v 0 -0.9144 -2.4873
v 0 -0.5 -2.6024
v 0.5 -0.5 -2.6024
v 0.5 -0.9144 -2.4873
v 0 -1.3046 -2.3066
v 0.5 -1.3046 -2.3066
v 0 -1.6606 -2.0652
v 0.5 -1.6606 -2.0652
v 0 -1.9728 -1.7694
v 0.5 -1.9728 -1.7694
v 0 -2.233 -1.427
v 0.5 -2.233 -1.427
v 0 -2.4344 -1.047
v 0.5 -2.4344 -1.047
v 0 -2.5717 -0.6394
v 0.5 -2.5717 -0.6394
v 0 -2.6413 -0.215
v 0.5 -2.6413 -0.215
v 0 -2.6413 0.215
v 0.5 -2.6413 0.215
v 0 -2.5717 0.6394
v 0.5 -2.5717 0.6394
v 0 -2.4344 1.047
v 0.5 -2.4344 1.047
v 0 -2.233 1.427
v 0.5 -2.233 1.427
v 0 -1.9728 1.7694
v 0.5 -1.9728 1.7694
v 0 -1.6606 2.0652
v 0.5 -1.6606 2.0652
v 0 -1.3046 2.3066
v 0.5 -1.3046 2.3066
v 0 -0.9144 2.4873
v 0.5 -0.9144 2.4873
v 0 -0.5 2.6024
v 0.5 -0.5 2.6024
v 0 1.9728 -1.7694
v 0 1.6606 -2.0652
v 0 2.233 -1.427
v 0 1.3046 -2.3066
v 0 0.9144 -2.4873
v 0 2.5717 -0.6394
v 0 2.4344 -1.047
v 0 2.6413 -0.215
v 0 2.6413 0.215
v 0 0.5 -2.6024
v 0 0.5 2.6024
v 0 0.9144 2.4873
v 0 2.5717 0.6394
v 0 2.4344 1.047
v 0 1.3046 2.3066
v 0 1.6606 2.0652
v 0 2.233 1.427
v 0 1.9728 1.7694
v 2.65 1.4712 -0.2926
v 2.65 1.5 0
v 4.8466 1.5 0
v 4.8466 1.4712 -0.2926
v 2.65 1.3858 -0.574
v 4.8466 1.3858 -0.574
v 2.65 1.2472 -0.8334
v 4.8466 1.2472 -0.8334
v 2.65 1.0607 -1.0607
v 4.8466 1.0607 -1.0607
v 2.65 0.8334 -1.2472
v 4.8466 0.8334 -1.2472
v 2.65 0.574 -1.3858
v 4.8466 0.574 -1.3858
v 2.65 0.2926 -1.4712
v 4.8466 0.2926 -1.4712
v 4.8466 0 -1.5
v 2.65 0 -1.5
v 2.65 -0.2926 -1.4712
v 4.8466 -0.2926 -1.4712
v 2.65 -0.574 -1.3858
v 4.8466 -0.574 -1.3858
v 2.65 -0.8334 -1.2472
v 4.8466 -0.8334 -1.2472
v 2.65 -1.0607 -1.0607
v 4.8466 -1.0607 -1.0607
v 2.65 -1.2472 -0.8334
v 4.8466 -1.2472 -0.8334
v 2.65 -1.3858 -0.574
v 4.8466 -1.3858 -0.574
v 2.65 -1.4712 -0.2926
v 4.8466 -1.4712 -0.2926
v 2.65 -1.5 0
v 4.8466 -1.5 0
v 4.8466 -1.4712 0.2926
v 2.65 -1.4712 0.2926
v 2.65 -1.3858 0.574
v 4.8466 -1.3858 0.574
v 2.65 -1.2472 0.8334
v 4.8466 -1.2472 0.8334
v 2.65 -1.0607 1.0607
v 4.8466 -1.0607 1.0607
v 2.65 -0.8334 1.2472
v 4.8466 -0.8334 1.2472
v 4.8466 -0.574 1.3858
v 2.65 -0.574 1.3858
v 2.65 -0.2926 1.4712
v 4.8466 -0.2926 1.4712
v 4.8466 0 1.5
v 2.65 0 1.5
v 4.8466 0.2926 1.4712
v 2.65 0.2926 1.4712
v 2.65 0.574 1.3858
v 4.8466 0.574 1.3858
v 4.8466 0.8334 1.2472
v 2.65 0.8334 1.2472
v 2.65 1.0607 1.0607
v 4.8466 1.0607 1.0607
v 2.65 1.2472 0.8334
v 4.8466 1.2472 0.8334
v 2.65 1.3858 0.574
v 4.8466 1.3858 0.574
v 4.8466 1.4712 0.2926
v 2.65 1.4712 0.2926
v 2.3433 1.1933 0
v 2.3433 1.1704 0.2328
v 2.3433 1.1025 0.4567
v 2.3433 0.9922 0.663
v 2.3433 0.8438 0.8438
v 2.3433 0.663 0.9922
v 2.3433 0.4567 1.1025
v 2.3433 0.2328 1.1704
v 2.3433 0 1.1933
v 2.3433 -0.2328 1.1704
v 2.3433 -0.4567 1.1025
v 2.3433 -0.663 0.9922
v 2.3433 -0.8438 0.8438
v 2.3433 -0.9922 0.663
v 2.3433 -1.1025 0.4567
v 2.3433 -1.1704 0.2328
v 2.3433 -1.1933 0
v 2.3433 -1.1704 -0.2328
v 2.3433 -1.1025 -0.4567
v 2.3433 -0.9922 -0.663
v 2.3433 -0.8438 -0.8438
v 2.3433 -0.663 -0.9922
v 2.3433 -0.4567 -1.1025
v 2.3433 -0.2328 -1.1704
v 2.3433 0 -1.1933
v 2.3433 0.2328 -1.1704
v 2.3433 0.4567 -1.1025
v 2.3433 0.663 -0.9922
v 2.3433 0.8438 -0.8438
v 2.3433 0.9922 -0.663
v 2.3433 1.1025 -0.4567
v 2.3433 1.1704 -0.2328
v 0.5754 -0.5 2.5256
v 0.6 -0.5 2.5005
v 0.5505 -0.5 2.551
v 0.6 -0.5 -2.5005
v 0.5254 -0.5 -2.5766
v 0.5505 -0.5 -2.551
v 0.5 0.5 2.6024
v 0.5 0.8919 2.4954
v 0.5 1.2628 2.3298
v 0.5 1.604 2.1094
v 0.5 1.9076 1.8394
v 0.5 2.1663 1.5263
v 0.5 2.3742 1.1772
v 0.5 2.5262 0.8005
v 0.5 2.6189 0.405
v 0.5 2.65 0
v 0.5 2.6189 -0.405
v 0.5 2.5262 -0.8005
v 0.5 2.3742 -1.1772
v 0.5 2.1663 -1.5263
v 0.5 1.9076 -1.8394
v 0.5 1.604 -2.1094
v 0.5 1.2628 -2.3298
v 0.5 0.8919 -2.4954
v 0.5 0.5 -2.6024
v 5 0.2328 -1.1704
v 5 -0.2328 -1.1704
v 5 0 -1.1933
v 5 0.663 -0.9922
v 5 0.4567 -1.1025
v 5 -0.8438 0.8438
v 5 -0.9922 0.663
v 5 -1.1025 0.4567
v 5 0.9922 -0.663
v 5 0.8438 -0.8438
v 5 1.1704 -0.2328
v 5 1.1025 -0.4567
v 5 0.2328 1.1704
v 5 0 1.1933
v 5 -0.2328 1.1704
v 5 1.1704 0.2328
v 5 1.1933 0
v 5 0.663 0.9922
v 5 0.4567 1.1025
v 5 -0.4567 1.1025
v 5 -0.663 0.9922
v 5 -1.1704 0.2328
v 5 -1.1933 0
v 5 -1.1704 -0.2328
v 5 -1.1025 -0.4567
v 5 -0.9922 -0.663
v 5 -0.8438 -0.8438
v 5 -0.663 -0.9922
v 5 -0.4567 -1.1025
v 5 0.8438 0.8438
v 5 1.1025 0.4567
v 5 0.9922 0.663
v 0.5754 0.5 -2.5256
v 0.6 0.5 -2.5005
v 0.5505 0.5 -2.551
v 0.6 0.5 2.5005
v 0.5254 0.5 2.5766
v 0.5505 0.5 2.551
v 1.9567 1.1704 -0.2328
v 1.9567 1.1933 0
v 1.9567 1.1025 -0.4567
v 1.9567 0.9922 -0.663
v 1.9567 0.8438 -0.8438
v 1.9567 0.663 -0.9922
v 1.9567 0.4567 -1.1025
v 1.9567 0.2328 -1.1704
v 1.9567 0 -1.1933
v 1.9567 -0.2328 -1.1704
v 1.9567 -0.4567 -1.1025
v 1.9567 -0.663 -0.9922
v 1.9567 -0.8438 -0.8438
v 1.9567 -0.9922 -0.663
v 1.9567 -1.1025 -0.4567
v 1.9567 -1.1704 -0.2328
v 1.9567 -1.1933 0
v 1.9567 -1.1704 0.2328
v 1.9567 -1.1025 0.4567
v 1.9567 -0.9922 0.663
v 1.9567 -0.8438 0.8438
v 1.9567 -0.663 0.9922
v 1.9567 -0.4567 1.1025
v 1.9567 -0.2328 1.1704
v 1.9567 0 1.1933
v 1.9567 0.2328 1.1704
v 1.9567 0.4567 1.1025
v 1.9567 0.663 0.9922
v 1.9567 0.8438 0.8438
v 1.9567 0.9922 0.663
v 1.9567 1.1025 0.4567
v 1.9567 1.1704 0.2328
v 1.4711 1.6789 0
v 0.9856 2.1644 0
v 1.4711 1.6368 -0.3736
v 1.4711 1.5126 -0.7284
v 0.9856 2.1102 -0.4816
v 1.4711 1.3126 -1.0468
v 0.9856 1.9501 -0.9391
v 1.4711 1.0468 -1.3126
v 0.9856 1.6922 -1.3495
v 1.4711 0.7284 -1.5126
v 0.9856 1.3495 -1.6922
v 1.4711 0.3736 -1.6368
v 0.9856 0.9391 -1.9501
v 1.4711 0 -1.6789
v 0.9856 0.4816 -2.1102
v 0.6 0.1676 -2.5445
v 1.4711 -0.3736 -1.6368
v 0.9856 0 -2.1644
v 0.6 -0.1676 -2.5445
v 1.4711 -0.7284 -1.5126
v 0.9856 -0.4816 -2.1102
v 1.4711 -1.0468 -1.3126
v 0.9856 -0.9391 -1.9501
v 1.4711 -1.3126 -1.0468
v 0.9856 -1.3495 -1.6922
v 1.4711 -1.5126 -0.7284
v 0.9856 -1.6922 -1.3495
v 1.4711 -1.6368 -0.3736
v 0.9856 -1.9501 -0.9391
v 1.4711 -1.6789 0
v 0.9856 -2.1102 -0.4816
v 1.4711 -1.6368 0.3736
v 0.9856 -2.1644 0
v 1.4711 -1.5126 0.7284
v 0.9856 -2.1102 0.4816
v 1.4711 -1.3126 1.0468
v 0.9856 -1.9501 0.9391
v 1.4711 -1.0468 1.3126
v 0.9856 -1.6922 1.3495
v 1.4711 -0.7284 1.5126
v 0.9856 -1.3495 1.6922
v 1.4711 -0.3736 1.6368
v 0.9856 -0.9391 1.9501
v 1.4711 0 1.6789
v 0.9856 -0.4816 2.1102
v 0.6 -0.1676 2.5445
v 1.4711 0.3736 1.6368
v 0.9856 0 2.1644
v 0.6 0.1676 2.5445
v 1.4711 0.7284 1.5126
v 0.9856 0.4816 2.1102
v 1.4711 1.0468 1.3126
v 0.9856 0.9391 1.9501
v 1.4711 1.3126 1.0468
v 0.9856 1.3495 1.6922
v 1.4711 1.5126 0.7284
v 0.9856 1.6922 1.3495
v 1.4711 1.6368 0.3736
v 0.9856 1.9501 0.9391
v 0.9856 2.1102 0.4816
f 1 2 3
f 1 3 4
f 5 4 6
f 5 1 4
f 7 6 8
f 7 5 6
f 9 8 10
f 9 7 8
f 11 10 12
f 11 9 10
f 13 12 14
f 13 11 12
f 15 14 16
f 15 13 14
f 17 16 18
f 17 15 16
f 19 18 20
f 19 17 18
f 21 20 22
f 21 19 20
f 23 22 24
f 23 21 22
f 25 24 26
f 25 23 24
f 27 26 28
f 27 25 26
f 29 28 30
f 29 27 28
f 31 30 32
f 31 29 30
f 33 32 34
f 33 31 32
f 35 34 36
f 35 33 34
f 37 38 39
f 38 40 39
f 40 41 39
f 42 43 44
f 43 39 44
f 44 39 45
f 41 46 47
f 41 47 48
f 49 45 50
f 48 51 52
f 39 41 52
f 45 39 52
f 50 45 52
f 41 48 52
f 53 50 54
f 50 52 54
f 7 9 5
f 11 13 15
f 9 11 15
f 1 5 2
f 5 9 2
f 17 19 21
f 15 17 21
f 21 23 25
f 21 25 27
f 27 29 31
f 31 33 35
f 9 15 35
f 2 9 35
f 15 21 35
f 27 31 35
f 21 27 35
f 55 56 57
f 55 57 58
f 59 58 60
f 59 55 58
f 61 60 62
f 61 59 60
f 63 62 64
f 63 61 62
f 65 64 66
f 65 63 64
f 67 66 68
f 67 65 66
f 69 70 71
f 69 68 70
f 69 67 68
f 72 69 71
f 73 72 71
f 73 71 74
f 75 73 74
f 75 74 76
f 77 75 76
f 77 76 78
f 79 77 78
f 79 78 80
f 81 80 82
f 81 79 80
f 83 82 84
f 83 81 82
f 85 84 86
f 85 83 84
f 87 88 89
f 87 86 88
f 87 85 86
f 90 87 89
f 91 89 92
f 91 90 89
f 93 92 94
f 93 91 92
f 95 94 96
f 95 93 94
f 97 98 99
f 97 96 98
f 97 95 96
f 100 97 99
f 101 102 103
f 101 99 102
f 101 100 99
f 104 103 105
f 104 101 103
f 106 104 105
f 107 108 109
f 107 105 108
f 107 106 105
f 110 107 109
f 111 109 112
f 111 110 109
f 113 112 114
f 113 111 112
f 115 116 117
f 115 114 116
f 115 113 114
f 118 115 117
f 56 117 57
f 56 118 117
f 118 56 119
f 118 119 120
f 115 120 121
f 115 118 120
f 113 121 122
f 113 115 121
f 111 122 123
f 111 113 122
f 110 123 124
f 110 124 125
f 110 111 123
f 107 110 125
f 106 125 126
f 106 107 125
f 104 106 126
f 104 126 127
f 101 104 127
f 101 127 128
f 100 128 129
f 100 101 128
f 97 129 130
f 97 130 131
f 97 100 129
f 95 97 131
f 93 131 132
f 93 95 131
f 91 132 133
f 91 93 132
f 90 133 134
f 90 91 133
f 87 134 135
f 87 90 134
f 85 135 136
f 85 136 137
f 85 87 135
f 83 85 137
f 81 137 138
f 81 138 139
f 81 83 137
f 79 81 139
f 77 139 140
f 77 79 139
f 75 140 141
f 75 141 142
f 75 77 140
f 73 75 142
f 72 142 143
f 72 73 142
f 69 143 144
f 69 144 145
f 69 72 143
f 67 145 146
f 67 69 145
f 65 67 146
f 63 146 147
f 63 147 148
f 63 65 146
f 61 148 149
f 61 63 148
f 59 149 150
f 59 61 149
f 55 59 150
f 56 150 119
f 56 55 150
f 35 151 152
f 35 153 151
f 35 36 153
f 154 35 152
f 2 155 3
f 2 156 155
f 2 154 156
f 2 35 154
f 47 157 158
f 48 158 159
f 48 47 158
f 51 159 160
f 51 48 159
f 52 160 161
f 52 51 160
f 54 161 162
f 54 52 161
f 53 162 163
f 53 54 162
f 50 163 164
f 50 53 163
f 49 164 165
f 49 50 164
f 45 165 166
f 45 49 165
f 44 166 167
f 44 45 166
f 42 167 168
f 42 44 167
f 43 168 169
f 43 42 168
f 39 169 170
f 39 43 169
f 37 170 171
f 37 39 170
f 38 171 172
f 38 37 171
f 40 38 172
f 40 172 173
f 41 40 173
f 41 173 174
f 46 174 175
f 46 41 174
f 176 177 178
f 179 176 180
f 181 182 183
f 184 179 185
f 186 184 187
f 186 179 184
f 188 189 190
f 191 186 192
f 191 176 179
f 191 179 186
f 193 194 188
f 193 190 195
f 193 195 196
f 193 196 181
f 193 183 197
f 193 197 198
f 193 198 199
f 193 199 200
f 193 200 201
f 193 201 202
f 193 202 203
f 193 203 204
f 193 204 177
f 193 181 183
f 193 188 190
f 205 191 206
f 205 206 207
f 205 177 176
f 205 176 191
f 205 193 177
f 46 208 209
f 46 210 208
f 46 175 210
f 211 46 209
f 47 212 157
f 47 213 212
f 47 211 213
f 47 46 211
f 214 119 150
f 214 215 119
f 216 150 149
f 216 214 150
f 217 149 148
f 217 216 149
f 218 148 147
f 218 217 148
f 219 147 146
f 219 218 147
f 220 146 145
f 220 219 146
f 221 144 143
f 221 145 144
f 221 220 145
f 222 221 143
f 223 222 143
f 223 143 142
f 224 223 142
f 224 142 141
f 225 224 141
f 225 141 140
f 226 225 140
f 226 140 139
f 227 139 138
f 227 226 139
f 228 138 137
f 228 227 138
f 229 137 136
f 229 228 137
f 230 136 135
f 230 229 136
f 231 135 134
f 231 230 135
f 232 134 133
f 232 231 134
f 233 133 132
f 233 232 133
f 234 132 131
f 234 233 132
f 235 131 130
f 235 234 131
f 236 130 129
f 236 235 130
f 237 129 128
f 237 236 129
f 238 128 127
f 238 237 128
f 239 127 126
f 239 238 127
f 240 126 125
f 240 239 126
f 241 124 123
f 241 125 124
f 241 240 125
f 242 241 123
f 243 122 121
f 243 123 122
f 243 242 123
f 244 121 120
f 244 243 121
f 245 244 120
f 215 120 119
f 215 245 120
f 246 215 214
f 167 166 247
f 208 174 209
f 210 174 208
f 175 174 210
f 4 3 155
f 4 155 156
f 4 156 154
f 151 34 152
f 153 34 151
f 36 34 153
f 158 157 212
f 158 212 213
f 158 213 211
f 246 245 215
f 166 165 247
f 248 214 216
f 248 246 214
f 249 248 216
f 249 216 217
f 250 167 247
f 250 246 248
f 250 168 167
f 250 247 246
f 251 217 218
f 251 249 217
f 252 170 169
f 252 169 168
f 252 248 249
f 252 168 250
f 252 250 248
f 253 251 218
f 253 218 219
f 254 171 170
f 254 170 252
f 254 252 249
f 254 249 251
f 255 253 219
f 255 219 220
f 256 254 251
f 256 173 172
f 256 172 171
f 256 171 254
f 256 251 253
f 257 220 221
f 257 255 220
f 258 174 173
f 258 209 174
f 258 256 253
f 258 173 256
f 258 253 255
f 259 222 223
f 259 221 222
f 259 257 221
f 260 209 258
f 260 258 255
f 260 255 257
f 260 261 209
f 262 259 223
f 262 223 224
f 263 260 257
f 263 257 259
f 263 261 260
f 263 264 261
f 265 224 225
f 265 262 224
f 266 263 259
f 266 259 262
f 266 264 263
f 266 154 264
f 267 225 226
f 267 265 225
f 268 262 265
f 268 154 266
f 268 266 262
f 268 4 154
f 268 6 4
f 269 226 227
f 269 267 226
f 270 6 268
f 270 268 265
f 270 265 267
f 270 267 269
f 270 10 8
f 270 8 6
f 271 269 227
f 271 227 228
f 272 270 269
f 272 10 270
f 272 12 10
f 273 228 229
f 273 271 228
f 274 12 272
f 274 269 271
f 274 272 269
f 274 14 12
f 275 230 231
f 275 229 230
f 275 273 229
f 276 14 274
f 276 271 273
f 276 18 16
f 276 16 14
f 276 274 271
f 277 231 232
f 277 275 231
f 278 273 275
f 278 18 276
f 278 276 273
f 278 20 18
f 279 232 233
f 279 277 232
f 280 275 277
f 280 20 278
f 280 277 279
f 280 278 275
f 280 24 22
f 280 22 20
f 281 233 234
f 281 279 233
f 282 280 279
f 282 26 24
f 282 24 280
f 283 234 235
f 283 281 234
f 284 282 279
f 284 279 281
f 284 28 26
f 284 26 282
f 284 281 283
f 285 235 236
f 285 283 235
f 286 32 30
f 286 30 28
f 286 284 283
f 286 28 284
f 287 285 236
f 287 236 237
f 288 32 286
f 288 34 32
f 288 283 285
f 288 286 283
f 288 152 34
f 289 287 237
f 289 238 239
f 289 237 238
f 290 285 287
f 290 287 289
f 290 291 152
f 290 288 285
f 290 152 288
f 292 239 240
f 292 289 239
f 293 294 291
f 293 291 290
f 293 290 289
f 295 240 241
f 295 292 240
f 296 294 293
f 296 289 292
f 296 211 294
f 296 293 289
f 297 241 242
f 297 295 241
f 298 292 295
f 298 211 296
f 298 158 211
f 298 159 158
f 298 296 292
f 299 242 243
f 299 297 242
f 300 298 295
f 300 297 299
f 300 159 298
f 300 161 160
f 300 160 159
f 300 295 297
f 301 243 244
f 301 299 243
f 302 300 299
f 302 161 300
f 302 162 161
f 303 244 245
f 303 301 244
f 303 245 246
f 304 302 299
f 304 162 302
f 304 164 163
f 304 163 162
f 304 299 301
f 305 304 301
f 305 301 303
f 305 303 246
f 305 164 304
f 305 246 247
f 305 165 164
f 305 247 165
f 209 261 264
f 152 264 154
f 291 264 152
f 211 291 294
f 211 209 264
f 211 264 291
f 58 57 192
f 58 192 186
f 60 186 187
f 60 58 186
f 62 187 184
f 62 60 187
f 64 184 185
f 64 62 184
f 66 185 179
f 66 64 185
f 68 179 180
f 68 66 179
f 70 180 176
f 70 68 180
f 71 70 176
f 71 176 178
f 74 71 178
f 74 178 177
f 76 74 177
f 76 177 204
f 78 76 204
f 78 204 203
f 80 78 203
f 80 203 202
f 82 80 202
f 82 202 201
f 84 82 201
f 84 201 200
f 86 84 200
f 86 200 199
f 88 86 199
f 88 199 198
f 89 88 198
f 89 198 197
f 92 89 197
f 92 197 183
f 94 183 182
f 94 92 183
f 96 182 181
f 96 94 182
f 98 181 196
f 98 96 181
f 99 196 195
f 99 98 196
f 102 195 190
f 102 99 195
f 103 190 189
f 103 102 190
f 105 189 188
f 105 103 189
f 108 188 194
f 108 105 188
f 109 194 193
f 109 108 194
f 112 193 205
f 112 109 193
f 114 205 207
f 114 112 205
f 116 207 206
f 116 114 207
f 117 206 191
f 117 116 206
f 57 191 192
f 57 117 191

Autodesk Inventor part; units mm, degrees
ref_plane "YZ Plane" through (0, 0, 0) normal (1, 0, 0) x (0, 1, 0)
ref_plane "XZ Plane" through (0, 0, 0) normal (0, 1, 0) x (-1, 0, 0)
sketch "Skizze1" plane through (0, 0, 0) normal (0, 0, 1) x (1, 0, 0)
  line L0 (0, 0) -> (5, 0)
  line L1 (5, 0) -> (5, 1.5)
  line L2 (5, 1.5) -> (2.65, 1.5)
  line L3 (2.65, 1.5) -> (2.3433, 1.1933)
  line L4 (2.3433, 1.1933) -> (1.9567, 1.1933)
  line L5 (1.9567, 1.1933) -> (0.5, 2.65)
  line L6 (0.5, 2.65) -> (0, 2.65)
  line L7 (0, 2.65) -> (0, 0)
  line L8 (2.65, 1.5) -> (1.65, 1.5) construction
  line L9 (-1, 0) -> (6, 0) projected
  line L10 (0, 3.18) -> (0, -0.53) projected
  dimension "d0" = 5
  dimension "d1" = 45
  dimension "d2" = 0.3067
  dimension "d3" = 2.35
  dimension "d4" = 1.65
  dimension "d5" = 2.3866
  dimension "d6" = 3
  dimension "d7" = 5.3
revolve "Körper" add sketch "Skizze1" angle 360 about axis through (0, 0, 0) along (1, 0, 0)
sketch "Skizze2" plane through (0, 0, 0) normal (-1, 0, 0) x (0, 0, 1)
  line L0 (2.65, -0.5) -> (-2.65, -0.5)
  line L1 (-2.65, -0.5) -> (-2.65, 0.5)
  line L2 (-2.65, 0.5) -> (2.65, 0.5)
  line L3 (2.65, 0.5) -> (2.65, -0.5)
  line L4 (0, 0.5) -> (0, -0.5) construction
  line L5 (-2.65, 0) -> (2.65, 0) construction
  line L6 (0, 2.65) -> (0, 0) projected
  dimension "d15" = 1
  dimension "d16" = 5.3
extrude "Loch" cut sketch "Skizze2" against normal blind 0.6
thread "Gewinde" size "M3x0.5" class "6g" standard "ISO Metric profile" length 2.35
chamfer "Fase1" distance 0.3067 distance2 0.1534 1 edges at (5, -1.5, 0) measured on face at (5, 0.263, 0.1197)
ref_plane "Work Plane1" through (33.575, 0, 0) normal (0, 0, -1) x (1, 0, 0)
equation "\"d0\" = NLG"
equation "\"d1\" = 0.5 * SEWI"
equation "\"d2\" = GAL"
equation "\"d3\" = GEL"
equation "\"d4\" = KOH"
equation "\"d5\" = BDM"
equation "\"d6\" = GD"
equation "\"d7\" = KOD"
equation "\"d15\" = SBR"
equation "\"d16\" = KOD"
equation "\"d8\" = STI"
equation "\"d10\" = GEL"
equation "\"d12\" = -0.5 * SPD + 0.5 * GD"
equation "\"d13\" = 0.5 * GAL"
equation "\"NLG\" = 5"
equation "\"GAL\" = 0.61345 * PTC"
equation "\"GEL\" = 2.35"
equation "\"KOH\" = 1.65"
equation "\"KOD\" = 5.3"
equation "\"SEWI\" = 90deg"
equation "\"BDM\" = NND - 1.2269 * PTC"
equation "\"GD\" = NND"
equation "\"SBR\" = 1"
equation "\"STI\" = 0.6"
equation "\"SPD\" = NND - 1.2269 * PTC"
equation "\"GUL\" = 0.61345 * PTC"
equation "\"PTC\" = 0.5"
equation "\"EPV\" = 3.15"
equation "\"THREADDIA\" = 3"
equation "\"TOA\" = 30deg"
equation "\"RR\" = 0.3"
equation "\"NND\" = 3"
equation "\"GD1\" = THREADDIA - 1.2269 * PTC"
properties part number "AS 1427 - M3 x 5" material "Steel, Mild"
